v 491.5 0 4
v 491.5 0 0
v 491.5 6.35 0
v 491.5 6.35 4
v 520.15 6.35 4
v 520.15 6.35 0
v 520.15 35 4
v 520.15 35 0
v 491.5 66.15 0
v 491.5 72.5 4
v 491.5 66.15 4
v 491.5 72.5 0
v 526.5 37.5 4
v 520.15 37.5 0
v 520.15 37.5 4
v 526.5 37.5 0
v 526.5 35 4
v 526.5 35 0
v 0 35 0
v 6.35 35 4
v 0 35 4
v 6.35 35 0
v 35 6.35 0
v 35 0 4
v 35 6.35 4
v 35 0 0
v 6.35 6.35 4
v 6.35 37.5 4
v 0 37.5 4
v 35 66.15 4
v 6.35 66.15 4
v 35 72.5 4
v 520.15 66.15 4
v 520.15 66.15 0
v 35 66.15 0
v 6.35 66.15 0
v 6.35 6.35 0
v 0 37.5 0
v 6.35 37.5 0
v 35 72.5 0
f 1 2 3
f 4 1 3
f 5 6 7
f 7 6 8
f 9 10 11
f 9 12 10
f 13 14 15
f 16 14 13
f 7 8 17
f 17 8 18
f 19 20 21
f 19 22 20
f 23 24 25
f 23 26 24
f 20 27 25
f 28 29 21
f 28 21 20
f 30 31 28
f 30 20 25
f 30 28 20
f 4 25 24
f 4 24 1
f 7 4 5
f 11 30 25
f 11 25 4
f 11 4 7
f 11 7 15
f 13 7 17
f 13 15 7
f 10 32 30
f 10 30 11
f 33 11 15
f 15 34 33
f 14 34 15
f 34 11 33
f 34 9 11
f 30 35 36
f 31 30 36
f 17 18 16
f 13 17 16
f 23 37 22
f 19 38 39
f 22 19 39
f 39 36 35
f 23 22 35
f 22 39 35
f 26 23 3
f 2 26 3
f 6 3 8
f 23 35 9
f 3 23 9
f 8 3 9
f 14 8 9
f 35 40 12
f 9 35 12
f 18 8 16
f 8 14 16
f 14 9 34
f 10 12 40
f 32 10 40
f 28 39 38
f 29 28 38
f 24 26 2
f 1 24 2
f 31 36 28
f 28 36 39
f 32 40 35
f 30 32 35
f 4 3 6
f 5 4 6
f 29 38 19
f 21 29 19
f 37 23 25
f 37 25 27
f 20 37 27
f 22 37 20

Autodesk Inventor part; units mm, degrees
ref_plane "YZ Plane" through (0, 0, 0) normal (1, 0, 0) x (0, 1, 0)
ref_plane "XZ Plane" through (0, 0, 0) normal (0, 1, 0) x (-1, 0, 0)
ref_plane "XY Plane" through (0, 0, 0) normal (0, 0, 1) x (1, 0, 0)
sketch "Skizze1" plane through (0, 0, 0) normal (0, 0, 1) x (1, 0, 0)
  line L0 (0, 0) -> (526.5, 0)
  line L1 (526.5, 0) -> (526.5, 72.5)
  line L2 (526.5, 72.5) -> (0, 72.5)
  line L3 (0, 72.5) -> (0, 0)
  line L4 (0, 72.5) -> (35, 72.5)
  line L5 (35, 72.5) -> (35, 66.15)
  line L6 (35, 66.15) -> (0, 66.15)
  line L7 (0, 66.15) -> (0, 72.5)
  line L8 (0, 72.5) -> (6.35, 72.5)
  line L9 (6.35, 72.5) -> (6.35, 37.5)
  line L10 (6.35, 37.5) -> (0, 37.5)
  line L11 (0, 37.5) -> (0, 72.5)
  line L12 (0, 36.25) -> (526.5, 36.25) construction
  line L13 (263.25, 72.5) -> (263.25, 0) construction
  line L14 (0, 0) -> (35, 0)
  line L15 (35, 0) -> (35, 6.35)
  line L16 (35, 6.35) -> (0, 6.35)
  line L17 (0, 6.35) -> (0, 0)
  line L18 (0, 0) -> (6.35, 0)
  line L19 (6.35, 0) -> (6.35, 35)
  line L20 (6.35, 35) -> (0, 35)
  line L21 (0, 35) -> (0, 0)
  line L22 (526.5, 72.5) -> (526.5, 0)
  line L23 (526.5, 72.5) -> (491.5, 72.5)
  line L24 (491.5, 72.5) -> (491.5, 66.15)
  line L25 (491.5, 66.15) -> (526.5, 66.15)
  line L26 (526.5, 66.15) -> (526.5, 72.5)
  line L27 (526.5, 72.5) -> (520.15, 72.5)
  line L28 (520.15, 72.5) -> (520.15, 37.5)
  line L29 (520.15, 37.5) -> (526.5, 37.5)
  line L30 (526.5, 37.5) -> (526.5, 72.5)
  line L31 (526.5, 0) -> (520.15, 0)
  line L32 (526.5, 0) -> (491.5, 0)
  line L33 (491.5, 0) -> (491.5, 6.35)
  line L34 (491.5, 6.35) -> (526.5, 6.35)
  line L35 (520.15, 0) -> (520.15, 35)
  line L36 (526.5, 6.35) -> (526.5, 0)
  line L37 (520.15, 35) -> (526.5, 35)
  line L38 (526.5, 35) -> (526.5, 0)
  point P0 (526.5, 37.5)
  point P1 (520.15, 66.15)
  point P2 (6.35, 66.15)
  point P3 (0, 37.5)
  point P4 (0, 35)
  point P5 (6.35, 6.35)
  point P6 (491.5, 0)
  point P7 (520.15, 6.35)
  point P8 (526.5, 35)
  dimension "d0" = 526.5
  dimension "d1" = 72.5
  dimension "d2" = 35
  dimension "d3" = 6.35
  dimension "d4" = 6.35
  dimension "d5" = 35
extrude "Extrusion1" add sketch "Skizze1" along normal blind 4 contours L15 L16 L19 L20 L3 L10 L9 L6 L5 L2 L24 L25 L28 L29 L1 L37 L35 L34 L33 L0
properties part number "103.012.01_Abdeckung_Gestell_front" material "PMMA-Kunststoff"
